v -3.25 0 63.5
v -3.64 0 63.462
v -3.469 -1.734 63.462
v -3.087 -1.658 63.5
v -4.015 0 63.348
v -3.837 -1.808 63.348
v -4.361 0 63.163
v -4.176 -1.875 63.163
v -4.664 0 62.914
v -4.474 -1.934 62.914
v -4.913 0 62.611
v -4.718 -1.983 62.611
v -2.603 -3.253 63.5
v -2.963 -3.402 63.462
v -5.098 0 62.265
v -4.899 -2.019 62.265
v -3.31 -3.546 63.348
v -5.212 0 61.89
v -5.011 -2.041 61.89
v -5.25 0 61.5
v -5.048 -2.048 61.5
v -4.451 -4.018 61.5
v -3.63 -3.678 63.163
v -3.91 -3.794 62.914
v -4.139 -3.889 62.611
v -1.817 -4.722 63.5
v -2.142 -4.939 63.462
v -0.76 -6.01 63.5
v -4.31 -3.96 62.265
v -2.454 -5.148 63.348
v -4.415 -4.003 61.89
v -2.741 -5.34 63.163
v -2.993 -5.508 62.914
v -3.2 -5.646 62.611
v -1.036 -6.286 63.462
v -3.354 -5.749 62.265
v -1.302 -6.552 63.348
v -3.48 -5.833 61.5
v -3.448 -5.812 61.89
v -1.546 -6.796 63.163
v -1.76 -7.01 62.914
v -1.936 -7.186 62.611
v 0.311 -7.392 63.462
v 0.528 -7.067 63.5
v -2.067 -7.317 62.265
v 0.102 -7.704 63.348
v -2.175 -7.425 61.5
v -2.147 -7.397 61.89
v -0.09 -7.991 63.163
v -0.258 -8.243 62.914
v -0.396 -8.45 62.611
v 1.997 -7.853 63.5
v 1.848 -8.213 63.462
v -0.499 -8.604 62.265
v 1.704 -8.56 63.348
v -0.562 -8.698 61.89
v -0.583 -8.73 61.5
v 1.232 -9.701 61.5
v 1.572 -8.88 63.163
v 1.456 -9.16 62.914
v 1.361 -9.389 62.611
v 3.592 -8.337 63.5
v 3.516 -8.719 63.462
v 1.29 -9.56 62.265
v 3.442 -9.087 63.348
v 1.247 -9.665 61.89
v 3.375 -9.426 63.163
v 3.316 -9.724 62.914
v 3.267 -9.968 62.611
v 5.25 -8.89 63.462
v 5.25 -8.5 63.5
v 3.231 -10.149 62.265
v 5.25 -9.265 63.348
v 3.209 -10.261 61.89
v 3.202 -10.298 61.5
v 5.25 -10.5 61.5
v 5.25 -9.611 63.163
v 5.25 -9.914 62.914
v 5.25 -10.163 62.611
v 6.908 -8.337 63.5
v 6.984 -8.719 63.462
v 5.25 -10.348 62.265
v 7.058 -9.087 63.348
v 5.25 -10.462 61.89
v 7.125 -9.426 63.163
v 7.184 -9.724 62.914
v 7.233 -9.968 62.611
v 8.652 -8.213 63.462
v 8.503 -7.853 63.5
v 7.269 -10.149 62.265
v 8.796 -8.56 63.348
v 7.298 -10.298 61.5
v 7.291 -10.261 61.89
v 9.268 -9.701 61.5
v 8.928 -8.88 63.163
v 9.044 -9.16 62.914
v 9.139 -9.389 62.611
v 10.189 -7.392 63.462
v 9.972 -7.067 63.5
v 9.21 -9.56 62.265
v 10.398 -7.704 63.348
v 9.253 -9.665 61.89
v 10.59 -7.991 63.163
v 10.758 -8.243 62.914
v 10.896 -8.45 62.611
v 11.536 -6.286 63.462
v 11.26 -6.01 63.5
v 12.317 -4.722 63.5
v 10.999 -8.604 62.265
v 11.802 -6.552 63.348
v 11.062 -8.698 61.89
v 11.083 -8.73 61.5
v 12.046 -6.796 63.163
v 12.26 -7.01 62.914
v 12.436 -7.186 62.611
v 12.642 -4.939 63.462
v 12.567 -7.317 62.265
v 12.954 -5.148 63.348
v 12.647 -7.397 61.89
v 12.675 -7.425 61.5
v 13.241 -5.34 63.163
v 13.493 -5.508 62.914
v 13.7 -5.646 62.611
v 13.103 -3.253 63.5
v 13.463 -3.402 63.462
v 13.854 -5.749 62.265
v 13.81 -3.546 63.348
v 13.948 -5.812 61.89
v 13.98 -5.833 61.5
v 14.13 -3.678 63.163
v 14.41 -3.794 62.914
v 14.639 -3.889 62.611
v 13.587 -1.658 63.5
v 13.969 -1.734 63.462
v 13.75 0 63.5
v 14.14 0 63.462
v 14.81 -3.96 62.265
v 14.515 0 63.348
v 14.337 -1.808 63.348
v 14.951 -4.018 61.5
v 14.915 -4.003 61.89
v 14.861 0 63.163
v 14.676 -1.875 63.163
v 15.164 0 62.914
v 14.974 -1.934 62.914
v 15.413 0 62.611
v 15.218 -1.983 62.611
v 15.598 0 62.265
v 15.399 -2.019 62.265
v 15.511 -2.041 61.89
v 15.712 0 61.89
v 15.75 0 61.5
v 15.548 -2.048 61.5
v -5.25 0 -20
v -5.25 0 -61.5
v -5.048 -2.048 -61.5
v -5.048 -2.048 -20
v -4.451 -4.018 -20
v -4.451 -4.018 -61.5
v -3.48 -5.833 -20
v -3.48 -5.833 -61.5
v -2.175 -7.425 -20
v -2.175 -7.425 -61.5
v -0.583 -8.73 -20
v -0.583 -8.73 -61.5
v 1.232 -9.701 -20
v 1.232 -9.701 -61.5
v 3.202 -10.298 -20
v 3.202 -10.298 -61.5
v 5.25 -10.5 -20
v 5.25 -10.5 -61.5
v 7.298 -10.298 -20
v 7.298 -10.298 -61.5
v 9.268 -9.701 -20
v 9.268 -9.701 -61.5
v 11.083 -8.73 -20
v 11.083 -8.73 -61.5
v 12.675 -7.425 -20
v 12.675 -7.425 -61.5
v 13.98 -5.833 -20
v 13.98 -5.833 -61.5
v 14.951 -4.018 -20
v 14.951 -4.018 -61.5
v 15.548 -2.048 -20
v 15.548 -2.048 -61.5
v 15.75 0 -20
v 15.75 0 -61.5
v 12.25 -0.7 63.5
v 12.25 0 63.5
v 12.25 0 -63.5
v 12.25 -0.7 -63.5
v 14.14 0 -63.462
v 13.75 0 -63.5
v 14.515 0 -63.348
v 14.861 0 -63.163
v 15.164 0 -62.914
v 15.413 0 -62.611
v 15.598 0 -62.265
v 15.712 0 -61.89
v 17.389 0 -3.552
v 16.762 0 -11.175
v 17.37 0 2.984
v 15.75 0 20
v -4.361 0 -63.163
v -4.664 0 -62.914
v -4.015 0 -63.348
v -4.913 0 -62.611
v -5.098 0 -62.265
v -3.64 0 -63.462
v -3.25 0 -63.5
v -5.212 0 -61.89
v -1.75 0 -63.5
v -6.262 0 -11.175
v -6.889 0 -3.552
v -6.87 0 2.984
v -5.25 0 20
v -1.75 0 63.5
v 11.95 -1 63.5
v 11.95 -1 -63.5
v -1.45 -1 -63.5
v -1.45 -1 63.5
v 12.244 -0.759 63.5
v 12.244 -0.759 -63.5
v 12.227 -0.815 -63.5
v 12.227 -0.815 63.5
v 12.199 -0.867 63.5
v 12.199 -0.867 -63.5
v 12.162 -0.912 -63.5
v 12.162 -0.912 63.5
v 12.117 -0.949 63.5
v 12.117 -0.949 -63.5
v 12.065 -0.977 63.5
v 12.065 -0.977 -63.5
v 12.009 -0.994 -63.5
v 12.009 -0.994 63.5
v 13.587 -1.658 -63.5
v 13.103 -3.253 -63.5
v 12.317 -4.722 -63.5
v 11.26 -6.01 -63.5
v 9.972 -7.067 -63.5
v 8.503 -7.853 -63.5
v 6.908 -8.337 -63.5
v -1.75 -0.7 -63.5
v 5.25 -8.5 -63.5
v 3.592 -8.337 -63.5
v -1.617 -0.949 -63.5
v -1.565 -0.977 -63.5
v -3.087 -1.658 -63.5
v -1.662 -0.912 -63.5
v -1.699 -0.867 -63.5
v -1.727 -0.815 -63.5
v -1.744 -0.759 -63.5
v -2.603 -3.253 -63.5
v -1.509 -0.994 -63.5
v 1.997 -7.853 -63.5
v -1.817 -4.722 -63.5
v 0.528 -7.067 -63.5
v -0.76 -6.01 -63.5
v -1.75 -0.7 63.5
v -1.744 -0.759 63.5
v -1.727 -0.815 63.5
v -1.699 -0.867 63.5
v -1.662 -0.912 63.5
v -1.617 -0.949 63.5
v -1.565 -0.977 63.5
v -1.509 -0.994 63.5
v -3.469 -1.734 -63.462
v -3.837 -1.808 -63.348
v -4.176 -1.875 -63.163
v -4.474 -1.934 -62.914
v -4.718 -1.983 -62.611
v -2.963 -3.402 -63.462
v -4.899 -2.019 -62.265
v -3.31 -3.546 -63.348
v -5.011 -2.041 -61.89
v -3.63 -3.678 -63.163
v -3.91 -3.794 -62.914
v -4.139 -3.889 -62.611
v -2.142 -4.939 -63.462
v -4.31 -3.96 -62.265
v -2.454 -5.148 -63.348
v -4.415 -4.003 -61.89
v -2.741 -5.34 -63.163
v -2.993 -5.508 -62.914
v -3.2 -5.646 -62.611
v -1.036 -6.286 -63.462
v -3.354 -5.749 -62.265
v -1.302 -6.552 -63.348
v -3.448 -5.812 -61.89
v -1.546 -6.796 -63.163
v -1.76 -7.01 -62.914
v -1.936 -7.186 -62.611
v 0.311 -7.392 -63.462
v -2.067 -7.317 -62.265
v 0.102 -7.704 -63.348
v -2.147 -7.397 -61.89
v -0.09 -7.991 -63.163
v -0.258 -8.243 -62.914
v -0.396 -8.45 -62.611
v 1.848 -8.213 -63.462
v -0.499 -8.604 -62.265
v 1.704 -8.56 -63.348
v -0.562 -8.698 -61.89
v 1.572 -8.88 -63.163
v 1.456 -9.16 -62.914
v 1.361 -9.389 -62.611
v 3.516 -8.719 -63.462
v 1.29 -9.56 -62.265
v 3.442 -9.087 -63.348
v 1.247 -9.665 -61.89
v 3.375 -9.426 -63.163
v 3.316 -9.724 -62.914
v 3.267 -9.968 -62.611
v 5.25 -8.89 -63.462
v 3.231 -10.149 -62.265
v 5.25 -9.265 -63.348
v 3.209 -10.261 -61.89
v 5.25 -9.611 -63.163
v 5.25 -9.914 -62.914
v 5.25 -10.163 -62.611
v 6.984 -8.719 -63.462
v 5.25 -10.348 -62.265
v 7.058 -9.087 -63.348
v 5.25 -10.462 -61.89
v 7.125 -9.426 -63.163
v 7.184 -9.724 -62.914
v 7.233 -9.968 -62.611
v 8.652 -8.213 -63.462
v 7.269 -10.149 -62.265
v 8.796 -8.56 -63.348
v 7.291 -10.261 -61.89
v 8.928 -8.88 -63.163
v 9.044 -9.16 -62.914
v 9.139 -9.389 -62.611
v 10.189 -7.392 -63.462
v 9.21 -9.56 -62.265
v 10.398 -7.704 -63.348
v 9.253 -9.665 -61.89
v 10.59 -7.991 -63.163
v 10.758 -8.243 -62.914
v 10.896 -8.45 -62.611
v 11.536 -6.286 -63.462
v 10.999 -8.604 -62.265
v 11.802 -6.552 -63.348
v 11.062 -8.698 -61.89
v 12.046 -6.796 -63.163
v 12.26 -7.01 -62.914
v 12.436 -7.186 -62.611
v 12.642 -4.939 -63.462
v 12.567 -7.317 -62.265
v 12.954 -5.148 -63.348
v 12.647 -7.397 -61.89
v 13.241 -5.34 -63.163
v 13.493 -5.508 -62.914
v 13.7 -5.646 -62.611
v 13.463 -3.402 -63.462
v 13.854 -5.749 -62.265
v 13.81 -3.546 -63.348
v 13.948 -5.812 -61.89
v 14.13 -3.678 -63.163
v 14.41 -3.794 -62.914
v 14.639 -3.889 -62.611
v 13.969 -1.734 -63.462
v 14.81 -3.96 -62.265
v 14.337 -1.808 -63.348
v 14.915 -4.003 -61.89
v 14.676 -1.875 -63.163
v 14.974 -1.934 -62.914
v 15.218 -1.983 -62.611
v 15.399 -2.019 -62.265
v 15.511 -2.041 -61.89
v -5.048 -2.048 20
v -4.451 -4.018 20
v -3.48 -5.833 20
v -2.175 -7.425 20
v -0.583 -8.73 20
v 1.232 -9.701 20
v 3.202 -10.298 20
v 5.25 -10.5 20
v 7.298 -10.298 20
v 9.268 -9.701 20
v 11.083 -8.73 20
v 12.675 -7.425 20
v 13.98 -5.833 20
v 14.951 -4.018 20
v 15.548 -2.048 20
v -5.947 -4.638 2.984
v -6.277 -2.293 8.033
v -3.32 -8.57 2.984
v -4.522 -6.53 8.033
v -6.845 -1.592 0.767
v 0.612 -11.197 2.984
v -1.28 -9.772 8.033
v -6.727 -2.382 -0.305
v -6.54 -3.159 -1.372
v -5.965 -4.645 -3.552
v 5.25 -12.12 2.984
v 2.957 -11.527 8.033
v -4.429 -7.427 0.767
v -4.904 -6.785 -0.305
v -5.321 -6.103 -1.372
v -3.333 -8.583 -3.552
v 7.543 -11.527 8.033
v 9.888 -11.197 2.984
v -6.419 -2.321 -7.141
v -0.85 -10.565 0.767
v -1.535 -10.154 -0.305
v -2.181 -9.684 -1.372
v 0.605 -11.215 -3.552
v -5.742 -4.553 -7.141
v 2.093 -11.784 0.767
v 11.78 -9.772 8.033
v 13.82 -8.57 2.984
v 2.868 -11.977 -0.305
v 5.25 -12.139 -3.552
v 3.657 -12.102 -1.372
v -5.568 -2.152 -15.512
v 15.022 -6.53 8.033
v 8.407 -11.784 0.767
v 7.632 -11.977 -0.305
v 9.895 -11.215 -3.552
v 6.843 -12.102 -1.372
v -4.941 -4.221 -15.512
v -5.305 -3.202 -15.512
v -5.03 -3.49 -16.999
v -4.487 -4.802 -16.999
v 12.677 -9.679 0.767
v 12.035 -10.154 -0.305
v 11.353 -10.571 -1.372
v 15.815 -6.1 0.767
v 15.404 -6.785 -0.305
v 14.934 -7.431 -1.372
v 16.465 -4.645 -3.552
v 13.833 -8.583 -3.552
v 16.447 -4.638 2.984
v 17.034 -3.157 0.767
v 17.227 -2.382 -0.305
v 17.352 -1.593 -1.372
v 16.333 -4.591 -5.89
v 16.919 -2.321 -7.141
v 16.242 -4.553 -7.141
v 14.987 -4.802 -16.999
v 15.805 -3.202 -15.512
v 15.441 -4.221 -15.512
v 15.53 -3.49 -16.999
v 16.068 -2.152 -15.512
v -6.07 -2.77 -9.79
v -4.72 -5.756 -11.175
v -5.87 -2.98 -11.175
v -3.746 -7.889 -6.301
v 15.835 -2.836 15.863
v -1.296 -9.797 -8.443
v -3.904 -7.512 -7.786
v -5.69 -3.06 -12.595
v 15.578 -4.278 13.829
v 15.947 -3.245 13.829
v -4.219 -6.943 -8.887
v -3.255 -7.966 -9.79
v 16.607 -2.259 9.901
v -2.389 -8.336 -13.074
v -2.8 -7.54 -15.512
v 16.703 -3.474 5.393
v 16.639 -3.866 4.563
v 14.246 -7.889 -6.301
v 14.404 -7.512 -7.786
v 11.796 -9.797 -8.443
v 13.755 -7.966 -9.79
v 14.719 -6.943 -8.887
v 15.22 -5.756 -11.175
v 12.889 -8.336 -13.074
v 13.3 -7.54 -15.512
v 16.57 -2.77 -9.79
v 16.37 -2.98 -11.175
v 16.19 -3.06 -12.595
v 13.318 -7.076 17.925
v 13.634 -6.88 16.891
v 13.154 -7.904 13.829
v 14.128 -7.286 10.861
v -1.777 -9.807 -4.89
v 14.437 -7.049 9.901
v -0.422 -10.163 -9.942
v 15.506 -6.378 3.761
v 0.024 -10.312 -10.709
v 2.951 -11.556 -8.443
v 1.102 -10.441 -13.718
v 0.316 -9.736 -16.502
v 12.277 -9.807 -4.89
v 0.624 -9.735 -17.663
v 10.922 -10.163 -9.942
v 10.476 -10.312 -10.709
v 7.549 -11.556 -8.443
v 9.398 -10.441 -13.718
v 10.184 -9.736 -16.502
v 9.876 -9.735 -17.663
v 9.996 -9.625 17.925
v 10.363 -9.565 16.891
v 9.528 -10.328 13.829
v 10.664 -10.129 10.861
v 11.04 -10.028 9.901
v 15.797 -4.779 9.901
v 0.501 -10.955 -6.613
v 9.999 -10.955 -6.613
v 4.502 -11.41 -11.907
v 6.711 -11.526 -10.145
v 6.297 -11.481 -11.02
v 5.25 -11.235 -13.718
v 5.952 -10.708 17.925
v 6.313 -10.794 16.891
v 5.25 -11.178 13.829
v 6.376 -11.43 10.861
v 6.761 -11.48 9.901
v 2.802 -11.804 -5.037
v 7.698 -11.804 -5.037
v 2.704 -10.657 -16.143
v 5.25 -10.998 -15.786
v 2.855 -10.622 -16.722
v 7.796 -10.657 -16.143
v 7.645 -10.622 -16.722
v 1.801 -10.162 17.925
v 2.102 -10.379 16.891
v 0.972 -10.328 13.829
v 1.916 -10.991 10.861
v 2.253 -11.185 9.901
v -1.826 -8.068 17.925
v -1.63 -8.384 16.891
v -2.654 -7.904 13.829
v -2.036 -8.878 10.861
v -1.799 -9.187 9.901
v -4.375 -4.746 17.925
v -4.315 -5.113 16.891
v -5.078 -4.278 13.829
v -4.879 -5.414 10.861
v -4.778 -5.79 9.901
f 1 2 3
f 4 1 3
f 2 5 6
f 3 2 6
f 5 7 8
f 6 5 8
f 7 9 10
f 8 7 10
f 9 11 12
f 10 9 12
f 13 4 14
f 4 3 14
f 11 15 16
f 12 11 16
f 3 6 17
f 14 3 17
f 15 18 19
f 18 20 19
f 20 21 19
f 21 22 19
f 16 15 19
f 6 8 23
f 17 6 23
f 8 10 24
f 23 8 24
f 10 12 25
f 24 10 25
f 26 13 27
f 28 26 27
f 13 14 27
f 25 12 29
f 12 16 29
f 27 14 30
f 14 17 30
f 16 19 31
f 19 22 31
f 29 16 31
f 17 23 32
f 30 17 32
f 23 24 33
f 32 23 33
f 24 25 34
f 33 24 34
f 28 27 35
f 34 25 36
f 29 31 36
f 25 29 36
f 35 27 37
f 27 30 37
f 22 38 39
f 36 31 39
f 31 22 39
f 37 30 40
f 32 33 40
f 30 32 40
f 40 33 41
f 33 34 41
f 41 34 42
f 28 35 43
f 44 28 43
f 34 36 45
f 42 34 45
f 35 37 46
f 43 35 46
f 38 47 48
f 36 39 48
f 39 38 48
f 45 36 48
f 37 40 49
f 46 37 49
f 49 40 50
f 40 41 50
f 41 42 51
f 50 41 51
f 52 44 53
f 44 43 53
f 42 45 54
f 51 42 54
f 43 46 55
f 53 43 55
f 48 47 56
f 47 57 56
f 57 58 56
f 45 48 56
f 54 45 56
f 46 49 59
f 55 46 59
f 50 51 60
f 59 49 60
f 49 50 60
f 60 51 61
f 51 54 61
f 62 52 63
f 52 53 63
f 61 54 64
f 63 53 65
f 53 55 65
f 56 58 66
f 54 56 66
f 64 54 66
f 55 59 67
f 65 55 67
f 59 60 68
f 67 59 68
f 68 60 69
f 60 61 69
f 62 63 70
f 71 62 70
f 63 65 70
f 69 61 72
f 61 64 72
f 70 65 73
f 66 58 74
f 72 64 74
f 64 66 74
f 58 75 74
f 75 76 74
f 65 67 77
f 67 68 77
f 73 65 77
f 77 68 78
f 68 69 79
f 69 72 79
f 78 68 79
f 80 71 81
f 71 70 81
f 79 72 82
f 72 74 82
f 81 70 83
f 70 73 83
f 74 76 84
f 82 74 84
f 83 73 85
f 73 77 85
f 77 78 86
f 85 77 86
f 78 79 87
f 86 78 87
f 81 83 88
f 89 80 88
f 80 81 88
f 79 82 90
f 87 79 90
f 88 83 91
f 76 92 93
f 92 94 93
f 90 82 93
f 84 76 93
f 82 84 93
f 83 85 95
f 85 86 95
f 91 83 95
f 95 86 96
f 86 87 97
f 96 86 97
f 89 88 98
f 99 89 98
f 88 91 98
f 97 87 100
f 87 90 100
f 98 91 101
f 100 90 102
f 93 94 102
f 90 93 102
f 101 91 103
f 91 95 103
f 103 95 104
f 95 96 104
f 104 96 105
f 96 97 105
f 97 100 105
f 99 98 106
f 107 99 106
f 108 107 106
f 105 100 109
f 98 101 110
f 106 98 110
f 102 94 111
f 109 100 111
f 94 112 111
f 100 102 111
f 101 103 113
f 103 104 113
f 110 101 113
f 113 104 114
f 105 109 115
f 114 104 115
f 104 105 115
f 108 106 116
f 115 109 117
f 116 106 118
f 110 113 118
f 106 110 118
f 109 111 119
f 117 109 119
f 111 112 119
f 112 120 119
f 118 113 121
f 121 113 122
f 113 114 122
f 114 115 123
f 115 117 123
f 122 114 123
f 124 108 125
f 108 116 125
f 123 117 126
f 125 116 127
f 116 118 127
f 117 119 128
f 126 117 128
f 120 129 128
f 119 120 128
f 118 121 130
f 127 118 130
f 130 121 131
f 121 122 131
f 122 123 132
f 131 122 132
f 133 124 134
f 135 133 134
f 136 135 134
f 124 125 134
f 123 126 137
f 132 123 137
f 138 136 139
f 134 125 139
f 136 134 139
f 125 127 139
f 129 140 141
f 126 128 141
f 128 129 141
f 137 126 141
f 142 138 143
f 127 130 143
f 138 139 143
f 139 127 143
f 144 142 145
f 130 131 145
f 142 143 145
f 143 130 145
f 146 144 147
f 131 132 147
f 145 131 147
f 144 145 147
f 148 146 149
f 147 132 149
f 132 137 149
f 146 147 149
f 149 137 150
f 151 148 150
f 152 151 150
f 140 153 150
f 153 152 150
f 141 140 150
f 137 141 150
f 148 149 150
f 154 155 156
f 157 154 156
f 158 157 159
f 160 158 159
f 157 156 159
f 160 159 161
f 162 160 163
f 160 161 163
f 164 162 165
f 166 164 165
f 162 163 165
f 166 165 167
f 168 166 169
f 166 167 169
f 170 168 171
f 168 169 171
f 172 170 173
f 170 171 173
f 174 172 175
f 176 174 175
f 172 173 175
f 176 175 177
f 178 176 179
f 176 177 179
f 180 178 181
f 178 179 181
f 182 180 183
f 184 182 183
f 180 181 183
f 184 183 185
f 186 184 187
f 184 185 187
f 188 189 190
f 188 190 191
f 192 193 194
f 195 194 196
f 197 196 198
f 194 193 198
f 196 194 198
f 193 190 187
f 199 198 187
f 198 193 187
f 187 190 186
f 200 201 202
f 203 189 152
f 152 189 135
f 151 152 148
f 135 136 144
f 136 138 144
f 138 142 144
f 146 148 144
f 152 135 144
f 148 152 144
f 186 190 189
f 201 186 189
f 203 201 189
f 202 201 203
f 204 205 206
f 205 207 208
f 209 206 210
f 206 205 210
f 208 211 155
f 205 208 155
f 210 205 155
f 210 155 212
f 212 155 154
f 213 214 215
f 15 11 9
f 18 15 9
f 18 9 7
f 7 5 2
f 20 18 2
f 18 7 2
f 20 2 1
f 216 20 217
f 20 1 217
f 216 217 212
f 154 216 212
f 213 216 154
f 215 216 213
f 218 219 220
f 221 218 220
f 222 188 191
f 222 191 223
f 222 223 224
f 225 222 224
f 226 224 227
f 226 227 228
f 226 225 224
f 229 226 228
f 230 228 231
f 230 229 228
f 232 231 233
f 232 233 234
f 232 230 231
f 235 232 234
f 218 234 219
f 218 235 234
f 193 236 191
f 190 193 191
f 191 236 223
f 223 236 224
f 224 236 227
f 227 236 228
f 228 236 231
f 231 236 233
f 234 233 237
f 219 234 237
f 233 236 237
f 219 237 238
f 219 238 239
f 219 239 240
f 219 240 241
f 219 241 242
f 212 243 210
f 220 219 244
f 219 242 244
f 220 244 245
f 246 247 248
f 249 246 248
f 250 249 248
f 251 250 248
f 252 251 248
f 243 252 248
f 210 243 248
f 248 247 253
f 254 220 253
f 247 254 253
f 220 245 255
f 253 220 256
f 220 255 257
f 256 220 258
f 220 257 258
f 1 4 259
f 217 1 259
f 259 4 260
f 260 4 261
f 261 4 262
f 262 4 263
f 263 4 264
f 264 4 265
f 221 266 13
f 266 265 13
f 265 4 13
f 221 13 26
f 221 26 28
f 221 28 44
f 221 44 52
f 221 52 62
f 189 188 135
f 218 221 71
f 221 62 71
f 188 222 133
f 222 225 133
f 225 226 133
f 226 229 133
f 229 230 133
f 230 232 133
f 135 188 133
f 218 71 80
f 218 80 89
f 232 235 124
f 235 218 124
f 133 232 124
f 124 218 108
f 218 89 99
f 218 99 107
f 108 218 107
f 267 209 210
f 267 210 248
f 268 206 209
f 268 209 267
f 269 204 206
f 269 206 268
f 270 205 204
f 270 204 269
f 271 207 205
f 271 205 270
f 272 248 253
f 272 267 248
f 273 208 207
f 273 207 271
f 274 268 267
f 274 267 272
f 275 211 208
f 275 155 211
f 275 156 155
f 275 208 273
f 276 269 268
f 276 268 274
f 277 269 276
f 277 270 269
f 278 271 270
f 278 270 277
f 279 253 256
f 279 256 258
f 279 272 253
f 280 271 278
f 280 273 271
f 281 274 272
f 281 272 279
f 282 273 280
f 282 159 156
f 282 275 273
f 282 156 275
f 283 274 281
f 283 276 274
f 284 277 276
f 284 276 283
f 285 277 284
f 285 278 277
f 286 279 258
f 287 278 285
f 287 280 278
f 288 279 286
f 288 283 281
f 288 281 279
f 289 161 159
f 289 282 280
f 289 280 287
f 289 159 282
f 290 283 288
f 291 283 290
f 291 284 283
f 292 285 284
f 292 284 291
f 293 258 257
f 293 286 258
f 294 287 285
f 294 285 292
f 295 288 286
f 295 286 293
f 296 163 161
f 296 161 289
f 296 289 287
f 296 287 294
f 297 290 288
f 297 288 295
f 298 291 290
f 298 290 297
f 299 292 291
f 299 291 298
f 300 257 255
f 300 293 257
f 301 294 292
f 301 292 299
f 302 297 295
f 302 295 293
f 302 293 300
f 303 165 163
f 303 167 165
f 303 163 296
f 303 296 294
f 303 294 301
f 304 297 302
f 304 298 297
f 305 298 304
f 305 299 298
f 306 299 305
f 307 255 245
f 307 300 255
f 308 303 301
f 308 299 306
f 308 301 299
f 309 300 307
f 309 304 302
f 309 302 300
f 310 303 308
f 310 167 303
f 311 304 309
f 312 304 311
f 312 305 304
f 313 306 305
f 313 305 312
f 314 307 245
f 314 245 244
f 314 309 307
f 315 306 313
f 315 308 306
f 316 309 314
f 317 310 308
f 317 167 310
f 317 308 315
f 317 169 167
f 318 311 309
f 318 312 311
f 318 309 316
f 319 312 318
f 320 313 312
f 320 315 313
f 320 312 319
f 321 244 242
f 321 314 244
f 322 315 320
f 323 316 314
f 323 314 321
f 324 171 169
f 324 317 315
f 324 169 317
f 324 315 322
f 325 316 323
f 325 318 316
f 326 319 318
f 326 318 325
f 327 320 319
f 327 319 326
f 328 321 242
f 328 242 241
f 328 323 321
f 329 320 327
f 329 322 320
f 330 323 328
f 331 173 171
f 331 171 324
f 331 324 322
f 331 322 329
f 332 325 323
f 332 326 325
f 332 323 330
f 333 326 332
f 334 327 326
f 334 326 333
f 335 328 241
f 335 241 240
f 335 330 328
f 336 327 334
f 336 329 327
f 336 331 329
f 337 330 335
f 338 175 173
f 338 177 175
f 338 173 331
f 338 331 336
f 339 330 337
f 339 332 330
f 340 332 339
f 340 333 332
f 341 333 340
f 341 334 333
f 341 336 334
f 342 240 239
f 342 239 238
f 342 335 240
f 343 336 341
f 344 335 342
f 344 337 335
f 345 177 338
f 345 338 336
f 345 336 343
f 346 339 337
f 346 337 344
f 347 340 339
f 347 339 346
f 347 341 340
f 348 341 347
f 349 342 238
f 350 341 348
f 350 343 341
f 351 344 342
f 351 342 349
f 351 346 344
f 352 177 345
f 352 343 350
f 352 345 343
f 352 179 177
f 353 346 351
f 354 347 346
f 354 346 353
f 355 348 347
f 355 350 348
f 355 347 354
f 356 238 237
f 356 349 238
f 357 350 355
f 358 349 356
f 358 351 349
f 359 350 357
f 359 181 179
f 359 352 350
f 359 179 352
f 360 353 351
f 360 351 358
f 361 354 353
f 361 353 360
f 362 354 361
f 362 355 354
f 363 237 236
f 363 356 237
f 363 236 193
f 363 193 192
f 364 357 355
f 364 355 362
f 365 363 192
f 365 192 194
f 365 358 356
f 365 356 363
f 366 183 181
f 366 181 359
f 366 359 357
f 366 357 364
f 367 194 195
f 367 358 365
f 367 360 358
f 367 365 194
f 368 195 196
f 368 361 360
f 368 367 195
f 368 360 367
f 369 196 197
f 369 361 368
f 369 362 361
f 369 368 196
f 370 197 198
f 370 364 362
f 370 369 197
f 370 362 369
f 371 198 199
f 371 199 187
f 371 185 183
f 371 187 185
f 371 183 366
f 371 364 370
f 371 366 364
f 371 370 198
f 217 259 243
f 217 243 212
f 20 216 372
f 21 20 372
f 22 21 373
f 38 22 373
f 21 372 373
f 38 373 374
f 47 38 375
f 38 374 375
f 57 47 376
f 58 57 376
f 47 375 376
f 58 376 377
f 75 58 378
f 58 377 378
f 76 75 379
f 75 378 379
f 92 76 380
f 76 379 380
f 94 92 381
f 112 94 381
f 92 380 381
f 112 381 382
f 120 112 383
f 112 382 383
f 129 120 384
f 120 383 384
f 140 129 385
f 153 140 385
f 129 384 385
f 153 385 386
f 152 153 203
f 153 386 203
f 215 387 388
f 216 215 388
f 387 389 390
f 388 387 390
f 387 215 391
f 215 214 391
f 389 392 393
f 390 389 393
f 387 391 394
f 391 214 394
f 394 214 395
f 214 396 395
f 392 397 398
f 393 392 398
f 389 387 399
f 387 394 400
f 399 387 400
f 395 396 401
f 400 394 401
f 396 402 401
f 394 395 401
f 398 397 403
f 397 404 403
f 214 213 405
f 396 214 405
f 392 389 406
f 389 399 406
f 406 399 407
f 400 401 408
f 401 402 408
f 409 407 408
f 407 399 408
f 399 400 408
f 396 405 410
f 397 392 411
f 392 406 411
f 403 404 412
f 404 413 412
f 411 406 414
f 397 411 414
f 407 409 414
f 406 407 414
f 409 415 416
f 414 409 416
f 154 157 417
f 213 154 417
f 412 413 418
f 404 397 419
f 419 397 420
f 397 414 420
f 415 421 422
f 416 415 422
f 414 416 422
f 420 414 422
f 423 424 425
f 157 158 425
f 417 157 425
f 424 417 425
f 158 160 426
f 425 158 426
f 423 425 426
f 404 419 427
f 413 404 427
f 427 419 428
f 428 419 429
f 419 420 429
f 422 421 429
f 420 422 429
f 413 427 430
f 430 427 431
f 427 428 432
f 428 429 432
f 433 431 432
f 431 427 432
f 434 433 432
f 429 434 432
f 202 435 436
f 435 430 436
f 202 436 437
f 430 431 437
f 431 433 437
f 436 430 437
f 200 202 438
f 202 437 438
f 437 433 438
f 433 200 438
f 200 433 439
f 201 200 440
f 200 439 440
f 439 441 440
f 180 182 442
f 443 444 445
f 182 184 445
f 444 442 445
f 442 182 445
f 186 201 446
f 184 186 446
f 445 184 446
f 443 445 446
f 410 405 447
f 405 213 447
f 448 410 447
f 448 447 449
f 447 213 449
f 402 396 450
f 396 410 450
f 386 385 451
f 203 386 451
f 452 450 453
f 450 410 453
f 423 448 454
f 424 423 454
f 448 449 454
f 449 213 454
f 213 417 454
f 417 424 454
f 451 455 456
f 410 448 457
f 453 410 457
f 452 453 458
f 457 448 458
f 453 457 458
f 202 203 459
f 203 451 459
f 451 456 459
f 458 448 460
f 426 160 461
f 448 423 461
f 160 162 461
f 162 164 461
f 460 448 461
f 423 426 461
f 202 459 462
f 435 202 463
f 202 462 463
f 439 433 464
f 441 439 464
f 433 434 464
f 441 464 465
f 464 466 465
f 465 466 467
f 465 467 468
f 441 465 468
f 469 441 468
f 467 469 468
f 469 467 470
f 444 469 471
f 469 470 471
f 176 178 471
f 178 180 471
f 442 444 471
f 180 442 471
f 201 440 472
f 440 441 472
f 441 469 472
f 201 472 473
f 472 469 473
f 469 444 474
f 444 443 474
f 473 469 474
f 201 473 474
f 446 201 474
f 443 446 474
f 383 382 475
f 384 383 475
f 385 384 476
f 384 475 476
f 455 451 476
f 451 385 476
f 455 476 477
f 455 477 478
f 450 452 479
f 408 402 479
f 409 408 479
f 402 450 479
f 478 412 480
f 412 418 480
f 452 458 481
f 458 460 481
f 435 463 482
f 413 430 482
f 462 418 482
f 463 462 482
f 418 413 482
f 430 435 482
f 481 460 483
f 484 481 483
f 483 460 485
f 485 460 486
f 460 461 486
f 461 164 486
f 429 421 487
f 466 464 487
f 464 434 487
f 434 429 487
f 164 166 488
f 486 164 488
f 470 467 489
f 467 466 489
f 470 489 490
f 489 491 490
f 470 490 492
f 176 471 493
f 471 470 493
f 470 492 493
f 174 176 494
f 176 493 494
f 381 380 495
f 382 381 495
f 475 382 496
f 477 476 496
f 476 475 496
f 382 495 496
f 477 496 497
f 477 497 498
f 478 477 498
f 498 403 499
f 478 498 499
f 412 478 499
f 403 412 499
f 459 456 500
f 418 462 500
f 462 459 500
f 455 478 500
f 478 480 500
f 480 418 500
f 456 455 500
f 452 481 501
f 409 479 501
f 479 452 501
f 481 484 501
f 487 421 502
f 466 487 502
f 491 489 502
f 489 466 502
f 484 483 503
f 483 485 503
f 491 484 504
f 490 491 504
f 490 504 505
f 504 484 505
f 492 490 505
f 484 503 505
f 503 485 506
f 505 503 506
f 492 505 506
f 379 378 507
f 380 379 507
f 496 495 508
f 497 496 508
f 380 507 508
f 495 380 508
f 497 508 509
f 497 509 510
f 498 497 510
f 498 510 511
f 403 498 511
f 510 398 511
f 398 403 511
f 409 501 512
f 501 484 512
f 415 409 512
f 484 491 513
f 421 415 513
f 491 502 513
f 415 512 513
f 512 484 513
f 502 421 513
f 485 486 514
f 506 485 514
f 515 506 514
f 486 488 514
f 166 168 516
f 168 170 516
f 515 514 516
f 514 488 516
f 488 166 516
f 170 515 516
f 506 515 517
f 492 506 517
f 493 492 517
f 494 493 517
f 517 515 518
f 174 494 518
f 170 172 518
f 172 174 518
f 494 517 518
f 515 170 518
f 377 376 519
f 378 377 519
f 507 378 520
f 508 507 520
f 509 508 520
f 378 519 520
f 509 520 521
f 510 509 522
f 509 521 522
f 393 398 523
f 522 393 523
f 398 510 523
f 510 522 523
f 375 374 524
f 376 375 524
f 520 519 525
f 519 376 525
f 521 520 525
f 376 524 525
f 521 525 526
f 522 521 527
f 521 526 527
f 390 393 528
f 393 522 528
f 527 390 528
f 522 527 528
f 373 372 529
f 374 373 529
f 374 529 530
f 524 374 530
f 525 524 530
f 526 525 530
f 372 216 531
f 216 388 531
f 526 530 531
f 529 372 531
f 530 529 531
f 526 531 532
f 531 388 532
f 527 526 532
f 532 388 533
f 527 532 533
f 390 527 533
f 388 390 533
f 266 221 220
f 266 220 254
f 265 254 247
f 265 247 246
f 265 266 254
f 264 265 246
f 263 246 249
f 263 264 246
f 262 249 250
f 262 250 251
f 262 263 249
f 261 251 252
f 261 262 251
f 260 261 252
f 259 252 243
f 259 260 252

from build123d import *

# Parameters (mm, degrees)
F1_ANGLE = 180
F3_DEPTH = 127
F6_R     = 2
F7_R     = 2


with BuildPart() as f1:
    # F0 (on Front) → F1 (revolve)
    with BuildSketch(Plane.XZ):
        with BuildLine():
            Line((5.25, 63.5), (-5.25, 63.5))
            Line((-5.25, 63.5), (-5.25, 20))
            add(Edge.make_bspline(
                [(-5.25, 20), (-5.8853452496, 14.3080799964), (-7.0077819126, 4.2524138852), (-7.0249760105, -5.1144951824), (-5.8863231474, -14.6635947641), (-5.25, -20)],
                knots=[0, 0, 0, 0, 0.3652549784, 0.6452799944, 1, 1, 1, 1], degree=3))
            Line((-5.25, -20), (-5.25, -63.5))
            Line((-5.25, -63.5), (5.25, -63.5))
            Line((5.25, -63.5), (5.25, 63.5))
        make_face()
    revolve(axis=Axis((5.25, 0, 0), (0, 0, -1)), revolution_arc=F1_ANGLE)

    # F2 (on face) → F3 (cut)
    with BuildSketch(Plane.XY.offset(63.5)):
        with BuildLine():
            Line((-1.75, 0), (5.25, 0))
            Line((5.25, 0), (12.25, 0))
            Line((12.25, 0), (12.25, 0.7))
            ThreePointArc((12.25, 0.7), (12.1621320344, 0.9121320344), (11.95, 1))
            Line((11.95, 1), (-1.45, 1))
            ThreePointArc((-1.45, 1), (-1.6621320344, 0.9121320344), (-1.75, 0.7))
            Line((-1.75, 0.7), (-1.75, 0))
        make_face()
    extrude(amount=-F3_DEPTH, mode=Mode.SUBTRACT)


with BuildPart() as f4_1:
    # F4: instance of F1
    add(f1.part.mirror(Plane.XZ))

    # F6
    f6_edges = [f4_1.edges().sort_by_distance(p)[0] for p in [
        (5.25, -10.5, 63.5),
    ]]
    fillet(f6_edges, radius=F6_R)

    # F7
    f7_edges = [f4_1.edges().sort_by_distance(p)[0] for p in [
        (5.25, -10.5, -63.5),
    ]]
    fillet(f7_edges, radius=F7_R)


solid = f4_1.part
